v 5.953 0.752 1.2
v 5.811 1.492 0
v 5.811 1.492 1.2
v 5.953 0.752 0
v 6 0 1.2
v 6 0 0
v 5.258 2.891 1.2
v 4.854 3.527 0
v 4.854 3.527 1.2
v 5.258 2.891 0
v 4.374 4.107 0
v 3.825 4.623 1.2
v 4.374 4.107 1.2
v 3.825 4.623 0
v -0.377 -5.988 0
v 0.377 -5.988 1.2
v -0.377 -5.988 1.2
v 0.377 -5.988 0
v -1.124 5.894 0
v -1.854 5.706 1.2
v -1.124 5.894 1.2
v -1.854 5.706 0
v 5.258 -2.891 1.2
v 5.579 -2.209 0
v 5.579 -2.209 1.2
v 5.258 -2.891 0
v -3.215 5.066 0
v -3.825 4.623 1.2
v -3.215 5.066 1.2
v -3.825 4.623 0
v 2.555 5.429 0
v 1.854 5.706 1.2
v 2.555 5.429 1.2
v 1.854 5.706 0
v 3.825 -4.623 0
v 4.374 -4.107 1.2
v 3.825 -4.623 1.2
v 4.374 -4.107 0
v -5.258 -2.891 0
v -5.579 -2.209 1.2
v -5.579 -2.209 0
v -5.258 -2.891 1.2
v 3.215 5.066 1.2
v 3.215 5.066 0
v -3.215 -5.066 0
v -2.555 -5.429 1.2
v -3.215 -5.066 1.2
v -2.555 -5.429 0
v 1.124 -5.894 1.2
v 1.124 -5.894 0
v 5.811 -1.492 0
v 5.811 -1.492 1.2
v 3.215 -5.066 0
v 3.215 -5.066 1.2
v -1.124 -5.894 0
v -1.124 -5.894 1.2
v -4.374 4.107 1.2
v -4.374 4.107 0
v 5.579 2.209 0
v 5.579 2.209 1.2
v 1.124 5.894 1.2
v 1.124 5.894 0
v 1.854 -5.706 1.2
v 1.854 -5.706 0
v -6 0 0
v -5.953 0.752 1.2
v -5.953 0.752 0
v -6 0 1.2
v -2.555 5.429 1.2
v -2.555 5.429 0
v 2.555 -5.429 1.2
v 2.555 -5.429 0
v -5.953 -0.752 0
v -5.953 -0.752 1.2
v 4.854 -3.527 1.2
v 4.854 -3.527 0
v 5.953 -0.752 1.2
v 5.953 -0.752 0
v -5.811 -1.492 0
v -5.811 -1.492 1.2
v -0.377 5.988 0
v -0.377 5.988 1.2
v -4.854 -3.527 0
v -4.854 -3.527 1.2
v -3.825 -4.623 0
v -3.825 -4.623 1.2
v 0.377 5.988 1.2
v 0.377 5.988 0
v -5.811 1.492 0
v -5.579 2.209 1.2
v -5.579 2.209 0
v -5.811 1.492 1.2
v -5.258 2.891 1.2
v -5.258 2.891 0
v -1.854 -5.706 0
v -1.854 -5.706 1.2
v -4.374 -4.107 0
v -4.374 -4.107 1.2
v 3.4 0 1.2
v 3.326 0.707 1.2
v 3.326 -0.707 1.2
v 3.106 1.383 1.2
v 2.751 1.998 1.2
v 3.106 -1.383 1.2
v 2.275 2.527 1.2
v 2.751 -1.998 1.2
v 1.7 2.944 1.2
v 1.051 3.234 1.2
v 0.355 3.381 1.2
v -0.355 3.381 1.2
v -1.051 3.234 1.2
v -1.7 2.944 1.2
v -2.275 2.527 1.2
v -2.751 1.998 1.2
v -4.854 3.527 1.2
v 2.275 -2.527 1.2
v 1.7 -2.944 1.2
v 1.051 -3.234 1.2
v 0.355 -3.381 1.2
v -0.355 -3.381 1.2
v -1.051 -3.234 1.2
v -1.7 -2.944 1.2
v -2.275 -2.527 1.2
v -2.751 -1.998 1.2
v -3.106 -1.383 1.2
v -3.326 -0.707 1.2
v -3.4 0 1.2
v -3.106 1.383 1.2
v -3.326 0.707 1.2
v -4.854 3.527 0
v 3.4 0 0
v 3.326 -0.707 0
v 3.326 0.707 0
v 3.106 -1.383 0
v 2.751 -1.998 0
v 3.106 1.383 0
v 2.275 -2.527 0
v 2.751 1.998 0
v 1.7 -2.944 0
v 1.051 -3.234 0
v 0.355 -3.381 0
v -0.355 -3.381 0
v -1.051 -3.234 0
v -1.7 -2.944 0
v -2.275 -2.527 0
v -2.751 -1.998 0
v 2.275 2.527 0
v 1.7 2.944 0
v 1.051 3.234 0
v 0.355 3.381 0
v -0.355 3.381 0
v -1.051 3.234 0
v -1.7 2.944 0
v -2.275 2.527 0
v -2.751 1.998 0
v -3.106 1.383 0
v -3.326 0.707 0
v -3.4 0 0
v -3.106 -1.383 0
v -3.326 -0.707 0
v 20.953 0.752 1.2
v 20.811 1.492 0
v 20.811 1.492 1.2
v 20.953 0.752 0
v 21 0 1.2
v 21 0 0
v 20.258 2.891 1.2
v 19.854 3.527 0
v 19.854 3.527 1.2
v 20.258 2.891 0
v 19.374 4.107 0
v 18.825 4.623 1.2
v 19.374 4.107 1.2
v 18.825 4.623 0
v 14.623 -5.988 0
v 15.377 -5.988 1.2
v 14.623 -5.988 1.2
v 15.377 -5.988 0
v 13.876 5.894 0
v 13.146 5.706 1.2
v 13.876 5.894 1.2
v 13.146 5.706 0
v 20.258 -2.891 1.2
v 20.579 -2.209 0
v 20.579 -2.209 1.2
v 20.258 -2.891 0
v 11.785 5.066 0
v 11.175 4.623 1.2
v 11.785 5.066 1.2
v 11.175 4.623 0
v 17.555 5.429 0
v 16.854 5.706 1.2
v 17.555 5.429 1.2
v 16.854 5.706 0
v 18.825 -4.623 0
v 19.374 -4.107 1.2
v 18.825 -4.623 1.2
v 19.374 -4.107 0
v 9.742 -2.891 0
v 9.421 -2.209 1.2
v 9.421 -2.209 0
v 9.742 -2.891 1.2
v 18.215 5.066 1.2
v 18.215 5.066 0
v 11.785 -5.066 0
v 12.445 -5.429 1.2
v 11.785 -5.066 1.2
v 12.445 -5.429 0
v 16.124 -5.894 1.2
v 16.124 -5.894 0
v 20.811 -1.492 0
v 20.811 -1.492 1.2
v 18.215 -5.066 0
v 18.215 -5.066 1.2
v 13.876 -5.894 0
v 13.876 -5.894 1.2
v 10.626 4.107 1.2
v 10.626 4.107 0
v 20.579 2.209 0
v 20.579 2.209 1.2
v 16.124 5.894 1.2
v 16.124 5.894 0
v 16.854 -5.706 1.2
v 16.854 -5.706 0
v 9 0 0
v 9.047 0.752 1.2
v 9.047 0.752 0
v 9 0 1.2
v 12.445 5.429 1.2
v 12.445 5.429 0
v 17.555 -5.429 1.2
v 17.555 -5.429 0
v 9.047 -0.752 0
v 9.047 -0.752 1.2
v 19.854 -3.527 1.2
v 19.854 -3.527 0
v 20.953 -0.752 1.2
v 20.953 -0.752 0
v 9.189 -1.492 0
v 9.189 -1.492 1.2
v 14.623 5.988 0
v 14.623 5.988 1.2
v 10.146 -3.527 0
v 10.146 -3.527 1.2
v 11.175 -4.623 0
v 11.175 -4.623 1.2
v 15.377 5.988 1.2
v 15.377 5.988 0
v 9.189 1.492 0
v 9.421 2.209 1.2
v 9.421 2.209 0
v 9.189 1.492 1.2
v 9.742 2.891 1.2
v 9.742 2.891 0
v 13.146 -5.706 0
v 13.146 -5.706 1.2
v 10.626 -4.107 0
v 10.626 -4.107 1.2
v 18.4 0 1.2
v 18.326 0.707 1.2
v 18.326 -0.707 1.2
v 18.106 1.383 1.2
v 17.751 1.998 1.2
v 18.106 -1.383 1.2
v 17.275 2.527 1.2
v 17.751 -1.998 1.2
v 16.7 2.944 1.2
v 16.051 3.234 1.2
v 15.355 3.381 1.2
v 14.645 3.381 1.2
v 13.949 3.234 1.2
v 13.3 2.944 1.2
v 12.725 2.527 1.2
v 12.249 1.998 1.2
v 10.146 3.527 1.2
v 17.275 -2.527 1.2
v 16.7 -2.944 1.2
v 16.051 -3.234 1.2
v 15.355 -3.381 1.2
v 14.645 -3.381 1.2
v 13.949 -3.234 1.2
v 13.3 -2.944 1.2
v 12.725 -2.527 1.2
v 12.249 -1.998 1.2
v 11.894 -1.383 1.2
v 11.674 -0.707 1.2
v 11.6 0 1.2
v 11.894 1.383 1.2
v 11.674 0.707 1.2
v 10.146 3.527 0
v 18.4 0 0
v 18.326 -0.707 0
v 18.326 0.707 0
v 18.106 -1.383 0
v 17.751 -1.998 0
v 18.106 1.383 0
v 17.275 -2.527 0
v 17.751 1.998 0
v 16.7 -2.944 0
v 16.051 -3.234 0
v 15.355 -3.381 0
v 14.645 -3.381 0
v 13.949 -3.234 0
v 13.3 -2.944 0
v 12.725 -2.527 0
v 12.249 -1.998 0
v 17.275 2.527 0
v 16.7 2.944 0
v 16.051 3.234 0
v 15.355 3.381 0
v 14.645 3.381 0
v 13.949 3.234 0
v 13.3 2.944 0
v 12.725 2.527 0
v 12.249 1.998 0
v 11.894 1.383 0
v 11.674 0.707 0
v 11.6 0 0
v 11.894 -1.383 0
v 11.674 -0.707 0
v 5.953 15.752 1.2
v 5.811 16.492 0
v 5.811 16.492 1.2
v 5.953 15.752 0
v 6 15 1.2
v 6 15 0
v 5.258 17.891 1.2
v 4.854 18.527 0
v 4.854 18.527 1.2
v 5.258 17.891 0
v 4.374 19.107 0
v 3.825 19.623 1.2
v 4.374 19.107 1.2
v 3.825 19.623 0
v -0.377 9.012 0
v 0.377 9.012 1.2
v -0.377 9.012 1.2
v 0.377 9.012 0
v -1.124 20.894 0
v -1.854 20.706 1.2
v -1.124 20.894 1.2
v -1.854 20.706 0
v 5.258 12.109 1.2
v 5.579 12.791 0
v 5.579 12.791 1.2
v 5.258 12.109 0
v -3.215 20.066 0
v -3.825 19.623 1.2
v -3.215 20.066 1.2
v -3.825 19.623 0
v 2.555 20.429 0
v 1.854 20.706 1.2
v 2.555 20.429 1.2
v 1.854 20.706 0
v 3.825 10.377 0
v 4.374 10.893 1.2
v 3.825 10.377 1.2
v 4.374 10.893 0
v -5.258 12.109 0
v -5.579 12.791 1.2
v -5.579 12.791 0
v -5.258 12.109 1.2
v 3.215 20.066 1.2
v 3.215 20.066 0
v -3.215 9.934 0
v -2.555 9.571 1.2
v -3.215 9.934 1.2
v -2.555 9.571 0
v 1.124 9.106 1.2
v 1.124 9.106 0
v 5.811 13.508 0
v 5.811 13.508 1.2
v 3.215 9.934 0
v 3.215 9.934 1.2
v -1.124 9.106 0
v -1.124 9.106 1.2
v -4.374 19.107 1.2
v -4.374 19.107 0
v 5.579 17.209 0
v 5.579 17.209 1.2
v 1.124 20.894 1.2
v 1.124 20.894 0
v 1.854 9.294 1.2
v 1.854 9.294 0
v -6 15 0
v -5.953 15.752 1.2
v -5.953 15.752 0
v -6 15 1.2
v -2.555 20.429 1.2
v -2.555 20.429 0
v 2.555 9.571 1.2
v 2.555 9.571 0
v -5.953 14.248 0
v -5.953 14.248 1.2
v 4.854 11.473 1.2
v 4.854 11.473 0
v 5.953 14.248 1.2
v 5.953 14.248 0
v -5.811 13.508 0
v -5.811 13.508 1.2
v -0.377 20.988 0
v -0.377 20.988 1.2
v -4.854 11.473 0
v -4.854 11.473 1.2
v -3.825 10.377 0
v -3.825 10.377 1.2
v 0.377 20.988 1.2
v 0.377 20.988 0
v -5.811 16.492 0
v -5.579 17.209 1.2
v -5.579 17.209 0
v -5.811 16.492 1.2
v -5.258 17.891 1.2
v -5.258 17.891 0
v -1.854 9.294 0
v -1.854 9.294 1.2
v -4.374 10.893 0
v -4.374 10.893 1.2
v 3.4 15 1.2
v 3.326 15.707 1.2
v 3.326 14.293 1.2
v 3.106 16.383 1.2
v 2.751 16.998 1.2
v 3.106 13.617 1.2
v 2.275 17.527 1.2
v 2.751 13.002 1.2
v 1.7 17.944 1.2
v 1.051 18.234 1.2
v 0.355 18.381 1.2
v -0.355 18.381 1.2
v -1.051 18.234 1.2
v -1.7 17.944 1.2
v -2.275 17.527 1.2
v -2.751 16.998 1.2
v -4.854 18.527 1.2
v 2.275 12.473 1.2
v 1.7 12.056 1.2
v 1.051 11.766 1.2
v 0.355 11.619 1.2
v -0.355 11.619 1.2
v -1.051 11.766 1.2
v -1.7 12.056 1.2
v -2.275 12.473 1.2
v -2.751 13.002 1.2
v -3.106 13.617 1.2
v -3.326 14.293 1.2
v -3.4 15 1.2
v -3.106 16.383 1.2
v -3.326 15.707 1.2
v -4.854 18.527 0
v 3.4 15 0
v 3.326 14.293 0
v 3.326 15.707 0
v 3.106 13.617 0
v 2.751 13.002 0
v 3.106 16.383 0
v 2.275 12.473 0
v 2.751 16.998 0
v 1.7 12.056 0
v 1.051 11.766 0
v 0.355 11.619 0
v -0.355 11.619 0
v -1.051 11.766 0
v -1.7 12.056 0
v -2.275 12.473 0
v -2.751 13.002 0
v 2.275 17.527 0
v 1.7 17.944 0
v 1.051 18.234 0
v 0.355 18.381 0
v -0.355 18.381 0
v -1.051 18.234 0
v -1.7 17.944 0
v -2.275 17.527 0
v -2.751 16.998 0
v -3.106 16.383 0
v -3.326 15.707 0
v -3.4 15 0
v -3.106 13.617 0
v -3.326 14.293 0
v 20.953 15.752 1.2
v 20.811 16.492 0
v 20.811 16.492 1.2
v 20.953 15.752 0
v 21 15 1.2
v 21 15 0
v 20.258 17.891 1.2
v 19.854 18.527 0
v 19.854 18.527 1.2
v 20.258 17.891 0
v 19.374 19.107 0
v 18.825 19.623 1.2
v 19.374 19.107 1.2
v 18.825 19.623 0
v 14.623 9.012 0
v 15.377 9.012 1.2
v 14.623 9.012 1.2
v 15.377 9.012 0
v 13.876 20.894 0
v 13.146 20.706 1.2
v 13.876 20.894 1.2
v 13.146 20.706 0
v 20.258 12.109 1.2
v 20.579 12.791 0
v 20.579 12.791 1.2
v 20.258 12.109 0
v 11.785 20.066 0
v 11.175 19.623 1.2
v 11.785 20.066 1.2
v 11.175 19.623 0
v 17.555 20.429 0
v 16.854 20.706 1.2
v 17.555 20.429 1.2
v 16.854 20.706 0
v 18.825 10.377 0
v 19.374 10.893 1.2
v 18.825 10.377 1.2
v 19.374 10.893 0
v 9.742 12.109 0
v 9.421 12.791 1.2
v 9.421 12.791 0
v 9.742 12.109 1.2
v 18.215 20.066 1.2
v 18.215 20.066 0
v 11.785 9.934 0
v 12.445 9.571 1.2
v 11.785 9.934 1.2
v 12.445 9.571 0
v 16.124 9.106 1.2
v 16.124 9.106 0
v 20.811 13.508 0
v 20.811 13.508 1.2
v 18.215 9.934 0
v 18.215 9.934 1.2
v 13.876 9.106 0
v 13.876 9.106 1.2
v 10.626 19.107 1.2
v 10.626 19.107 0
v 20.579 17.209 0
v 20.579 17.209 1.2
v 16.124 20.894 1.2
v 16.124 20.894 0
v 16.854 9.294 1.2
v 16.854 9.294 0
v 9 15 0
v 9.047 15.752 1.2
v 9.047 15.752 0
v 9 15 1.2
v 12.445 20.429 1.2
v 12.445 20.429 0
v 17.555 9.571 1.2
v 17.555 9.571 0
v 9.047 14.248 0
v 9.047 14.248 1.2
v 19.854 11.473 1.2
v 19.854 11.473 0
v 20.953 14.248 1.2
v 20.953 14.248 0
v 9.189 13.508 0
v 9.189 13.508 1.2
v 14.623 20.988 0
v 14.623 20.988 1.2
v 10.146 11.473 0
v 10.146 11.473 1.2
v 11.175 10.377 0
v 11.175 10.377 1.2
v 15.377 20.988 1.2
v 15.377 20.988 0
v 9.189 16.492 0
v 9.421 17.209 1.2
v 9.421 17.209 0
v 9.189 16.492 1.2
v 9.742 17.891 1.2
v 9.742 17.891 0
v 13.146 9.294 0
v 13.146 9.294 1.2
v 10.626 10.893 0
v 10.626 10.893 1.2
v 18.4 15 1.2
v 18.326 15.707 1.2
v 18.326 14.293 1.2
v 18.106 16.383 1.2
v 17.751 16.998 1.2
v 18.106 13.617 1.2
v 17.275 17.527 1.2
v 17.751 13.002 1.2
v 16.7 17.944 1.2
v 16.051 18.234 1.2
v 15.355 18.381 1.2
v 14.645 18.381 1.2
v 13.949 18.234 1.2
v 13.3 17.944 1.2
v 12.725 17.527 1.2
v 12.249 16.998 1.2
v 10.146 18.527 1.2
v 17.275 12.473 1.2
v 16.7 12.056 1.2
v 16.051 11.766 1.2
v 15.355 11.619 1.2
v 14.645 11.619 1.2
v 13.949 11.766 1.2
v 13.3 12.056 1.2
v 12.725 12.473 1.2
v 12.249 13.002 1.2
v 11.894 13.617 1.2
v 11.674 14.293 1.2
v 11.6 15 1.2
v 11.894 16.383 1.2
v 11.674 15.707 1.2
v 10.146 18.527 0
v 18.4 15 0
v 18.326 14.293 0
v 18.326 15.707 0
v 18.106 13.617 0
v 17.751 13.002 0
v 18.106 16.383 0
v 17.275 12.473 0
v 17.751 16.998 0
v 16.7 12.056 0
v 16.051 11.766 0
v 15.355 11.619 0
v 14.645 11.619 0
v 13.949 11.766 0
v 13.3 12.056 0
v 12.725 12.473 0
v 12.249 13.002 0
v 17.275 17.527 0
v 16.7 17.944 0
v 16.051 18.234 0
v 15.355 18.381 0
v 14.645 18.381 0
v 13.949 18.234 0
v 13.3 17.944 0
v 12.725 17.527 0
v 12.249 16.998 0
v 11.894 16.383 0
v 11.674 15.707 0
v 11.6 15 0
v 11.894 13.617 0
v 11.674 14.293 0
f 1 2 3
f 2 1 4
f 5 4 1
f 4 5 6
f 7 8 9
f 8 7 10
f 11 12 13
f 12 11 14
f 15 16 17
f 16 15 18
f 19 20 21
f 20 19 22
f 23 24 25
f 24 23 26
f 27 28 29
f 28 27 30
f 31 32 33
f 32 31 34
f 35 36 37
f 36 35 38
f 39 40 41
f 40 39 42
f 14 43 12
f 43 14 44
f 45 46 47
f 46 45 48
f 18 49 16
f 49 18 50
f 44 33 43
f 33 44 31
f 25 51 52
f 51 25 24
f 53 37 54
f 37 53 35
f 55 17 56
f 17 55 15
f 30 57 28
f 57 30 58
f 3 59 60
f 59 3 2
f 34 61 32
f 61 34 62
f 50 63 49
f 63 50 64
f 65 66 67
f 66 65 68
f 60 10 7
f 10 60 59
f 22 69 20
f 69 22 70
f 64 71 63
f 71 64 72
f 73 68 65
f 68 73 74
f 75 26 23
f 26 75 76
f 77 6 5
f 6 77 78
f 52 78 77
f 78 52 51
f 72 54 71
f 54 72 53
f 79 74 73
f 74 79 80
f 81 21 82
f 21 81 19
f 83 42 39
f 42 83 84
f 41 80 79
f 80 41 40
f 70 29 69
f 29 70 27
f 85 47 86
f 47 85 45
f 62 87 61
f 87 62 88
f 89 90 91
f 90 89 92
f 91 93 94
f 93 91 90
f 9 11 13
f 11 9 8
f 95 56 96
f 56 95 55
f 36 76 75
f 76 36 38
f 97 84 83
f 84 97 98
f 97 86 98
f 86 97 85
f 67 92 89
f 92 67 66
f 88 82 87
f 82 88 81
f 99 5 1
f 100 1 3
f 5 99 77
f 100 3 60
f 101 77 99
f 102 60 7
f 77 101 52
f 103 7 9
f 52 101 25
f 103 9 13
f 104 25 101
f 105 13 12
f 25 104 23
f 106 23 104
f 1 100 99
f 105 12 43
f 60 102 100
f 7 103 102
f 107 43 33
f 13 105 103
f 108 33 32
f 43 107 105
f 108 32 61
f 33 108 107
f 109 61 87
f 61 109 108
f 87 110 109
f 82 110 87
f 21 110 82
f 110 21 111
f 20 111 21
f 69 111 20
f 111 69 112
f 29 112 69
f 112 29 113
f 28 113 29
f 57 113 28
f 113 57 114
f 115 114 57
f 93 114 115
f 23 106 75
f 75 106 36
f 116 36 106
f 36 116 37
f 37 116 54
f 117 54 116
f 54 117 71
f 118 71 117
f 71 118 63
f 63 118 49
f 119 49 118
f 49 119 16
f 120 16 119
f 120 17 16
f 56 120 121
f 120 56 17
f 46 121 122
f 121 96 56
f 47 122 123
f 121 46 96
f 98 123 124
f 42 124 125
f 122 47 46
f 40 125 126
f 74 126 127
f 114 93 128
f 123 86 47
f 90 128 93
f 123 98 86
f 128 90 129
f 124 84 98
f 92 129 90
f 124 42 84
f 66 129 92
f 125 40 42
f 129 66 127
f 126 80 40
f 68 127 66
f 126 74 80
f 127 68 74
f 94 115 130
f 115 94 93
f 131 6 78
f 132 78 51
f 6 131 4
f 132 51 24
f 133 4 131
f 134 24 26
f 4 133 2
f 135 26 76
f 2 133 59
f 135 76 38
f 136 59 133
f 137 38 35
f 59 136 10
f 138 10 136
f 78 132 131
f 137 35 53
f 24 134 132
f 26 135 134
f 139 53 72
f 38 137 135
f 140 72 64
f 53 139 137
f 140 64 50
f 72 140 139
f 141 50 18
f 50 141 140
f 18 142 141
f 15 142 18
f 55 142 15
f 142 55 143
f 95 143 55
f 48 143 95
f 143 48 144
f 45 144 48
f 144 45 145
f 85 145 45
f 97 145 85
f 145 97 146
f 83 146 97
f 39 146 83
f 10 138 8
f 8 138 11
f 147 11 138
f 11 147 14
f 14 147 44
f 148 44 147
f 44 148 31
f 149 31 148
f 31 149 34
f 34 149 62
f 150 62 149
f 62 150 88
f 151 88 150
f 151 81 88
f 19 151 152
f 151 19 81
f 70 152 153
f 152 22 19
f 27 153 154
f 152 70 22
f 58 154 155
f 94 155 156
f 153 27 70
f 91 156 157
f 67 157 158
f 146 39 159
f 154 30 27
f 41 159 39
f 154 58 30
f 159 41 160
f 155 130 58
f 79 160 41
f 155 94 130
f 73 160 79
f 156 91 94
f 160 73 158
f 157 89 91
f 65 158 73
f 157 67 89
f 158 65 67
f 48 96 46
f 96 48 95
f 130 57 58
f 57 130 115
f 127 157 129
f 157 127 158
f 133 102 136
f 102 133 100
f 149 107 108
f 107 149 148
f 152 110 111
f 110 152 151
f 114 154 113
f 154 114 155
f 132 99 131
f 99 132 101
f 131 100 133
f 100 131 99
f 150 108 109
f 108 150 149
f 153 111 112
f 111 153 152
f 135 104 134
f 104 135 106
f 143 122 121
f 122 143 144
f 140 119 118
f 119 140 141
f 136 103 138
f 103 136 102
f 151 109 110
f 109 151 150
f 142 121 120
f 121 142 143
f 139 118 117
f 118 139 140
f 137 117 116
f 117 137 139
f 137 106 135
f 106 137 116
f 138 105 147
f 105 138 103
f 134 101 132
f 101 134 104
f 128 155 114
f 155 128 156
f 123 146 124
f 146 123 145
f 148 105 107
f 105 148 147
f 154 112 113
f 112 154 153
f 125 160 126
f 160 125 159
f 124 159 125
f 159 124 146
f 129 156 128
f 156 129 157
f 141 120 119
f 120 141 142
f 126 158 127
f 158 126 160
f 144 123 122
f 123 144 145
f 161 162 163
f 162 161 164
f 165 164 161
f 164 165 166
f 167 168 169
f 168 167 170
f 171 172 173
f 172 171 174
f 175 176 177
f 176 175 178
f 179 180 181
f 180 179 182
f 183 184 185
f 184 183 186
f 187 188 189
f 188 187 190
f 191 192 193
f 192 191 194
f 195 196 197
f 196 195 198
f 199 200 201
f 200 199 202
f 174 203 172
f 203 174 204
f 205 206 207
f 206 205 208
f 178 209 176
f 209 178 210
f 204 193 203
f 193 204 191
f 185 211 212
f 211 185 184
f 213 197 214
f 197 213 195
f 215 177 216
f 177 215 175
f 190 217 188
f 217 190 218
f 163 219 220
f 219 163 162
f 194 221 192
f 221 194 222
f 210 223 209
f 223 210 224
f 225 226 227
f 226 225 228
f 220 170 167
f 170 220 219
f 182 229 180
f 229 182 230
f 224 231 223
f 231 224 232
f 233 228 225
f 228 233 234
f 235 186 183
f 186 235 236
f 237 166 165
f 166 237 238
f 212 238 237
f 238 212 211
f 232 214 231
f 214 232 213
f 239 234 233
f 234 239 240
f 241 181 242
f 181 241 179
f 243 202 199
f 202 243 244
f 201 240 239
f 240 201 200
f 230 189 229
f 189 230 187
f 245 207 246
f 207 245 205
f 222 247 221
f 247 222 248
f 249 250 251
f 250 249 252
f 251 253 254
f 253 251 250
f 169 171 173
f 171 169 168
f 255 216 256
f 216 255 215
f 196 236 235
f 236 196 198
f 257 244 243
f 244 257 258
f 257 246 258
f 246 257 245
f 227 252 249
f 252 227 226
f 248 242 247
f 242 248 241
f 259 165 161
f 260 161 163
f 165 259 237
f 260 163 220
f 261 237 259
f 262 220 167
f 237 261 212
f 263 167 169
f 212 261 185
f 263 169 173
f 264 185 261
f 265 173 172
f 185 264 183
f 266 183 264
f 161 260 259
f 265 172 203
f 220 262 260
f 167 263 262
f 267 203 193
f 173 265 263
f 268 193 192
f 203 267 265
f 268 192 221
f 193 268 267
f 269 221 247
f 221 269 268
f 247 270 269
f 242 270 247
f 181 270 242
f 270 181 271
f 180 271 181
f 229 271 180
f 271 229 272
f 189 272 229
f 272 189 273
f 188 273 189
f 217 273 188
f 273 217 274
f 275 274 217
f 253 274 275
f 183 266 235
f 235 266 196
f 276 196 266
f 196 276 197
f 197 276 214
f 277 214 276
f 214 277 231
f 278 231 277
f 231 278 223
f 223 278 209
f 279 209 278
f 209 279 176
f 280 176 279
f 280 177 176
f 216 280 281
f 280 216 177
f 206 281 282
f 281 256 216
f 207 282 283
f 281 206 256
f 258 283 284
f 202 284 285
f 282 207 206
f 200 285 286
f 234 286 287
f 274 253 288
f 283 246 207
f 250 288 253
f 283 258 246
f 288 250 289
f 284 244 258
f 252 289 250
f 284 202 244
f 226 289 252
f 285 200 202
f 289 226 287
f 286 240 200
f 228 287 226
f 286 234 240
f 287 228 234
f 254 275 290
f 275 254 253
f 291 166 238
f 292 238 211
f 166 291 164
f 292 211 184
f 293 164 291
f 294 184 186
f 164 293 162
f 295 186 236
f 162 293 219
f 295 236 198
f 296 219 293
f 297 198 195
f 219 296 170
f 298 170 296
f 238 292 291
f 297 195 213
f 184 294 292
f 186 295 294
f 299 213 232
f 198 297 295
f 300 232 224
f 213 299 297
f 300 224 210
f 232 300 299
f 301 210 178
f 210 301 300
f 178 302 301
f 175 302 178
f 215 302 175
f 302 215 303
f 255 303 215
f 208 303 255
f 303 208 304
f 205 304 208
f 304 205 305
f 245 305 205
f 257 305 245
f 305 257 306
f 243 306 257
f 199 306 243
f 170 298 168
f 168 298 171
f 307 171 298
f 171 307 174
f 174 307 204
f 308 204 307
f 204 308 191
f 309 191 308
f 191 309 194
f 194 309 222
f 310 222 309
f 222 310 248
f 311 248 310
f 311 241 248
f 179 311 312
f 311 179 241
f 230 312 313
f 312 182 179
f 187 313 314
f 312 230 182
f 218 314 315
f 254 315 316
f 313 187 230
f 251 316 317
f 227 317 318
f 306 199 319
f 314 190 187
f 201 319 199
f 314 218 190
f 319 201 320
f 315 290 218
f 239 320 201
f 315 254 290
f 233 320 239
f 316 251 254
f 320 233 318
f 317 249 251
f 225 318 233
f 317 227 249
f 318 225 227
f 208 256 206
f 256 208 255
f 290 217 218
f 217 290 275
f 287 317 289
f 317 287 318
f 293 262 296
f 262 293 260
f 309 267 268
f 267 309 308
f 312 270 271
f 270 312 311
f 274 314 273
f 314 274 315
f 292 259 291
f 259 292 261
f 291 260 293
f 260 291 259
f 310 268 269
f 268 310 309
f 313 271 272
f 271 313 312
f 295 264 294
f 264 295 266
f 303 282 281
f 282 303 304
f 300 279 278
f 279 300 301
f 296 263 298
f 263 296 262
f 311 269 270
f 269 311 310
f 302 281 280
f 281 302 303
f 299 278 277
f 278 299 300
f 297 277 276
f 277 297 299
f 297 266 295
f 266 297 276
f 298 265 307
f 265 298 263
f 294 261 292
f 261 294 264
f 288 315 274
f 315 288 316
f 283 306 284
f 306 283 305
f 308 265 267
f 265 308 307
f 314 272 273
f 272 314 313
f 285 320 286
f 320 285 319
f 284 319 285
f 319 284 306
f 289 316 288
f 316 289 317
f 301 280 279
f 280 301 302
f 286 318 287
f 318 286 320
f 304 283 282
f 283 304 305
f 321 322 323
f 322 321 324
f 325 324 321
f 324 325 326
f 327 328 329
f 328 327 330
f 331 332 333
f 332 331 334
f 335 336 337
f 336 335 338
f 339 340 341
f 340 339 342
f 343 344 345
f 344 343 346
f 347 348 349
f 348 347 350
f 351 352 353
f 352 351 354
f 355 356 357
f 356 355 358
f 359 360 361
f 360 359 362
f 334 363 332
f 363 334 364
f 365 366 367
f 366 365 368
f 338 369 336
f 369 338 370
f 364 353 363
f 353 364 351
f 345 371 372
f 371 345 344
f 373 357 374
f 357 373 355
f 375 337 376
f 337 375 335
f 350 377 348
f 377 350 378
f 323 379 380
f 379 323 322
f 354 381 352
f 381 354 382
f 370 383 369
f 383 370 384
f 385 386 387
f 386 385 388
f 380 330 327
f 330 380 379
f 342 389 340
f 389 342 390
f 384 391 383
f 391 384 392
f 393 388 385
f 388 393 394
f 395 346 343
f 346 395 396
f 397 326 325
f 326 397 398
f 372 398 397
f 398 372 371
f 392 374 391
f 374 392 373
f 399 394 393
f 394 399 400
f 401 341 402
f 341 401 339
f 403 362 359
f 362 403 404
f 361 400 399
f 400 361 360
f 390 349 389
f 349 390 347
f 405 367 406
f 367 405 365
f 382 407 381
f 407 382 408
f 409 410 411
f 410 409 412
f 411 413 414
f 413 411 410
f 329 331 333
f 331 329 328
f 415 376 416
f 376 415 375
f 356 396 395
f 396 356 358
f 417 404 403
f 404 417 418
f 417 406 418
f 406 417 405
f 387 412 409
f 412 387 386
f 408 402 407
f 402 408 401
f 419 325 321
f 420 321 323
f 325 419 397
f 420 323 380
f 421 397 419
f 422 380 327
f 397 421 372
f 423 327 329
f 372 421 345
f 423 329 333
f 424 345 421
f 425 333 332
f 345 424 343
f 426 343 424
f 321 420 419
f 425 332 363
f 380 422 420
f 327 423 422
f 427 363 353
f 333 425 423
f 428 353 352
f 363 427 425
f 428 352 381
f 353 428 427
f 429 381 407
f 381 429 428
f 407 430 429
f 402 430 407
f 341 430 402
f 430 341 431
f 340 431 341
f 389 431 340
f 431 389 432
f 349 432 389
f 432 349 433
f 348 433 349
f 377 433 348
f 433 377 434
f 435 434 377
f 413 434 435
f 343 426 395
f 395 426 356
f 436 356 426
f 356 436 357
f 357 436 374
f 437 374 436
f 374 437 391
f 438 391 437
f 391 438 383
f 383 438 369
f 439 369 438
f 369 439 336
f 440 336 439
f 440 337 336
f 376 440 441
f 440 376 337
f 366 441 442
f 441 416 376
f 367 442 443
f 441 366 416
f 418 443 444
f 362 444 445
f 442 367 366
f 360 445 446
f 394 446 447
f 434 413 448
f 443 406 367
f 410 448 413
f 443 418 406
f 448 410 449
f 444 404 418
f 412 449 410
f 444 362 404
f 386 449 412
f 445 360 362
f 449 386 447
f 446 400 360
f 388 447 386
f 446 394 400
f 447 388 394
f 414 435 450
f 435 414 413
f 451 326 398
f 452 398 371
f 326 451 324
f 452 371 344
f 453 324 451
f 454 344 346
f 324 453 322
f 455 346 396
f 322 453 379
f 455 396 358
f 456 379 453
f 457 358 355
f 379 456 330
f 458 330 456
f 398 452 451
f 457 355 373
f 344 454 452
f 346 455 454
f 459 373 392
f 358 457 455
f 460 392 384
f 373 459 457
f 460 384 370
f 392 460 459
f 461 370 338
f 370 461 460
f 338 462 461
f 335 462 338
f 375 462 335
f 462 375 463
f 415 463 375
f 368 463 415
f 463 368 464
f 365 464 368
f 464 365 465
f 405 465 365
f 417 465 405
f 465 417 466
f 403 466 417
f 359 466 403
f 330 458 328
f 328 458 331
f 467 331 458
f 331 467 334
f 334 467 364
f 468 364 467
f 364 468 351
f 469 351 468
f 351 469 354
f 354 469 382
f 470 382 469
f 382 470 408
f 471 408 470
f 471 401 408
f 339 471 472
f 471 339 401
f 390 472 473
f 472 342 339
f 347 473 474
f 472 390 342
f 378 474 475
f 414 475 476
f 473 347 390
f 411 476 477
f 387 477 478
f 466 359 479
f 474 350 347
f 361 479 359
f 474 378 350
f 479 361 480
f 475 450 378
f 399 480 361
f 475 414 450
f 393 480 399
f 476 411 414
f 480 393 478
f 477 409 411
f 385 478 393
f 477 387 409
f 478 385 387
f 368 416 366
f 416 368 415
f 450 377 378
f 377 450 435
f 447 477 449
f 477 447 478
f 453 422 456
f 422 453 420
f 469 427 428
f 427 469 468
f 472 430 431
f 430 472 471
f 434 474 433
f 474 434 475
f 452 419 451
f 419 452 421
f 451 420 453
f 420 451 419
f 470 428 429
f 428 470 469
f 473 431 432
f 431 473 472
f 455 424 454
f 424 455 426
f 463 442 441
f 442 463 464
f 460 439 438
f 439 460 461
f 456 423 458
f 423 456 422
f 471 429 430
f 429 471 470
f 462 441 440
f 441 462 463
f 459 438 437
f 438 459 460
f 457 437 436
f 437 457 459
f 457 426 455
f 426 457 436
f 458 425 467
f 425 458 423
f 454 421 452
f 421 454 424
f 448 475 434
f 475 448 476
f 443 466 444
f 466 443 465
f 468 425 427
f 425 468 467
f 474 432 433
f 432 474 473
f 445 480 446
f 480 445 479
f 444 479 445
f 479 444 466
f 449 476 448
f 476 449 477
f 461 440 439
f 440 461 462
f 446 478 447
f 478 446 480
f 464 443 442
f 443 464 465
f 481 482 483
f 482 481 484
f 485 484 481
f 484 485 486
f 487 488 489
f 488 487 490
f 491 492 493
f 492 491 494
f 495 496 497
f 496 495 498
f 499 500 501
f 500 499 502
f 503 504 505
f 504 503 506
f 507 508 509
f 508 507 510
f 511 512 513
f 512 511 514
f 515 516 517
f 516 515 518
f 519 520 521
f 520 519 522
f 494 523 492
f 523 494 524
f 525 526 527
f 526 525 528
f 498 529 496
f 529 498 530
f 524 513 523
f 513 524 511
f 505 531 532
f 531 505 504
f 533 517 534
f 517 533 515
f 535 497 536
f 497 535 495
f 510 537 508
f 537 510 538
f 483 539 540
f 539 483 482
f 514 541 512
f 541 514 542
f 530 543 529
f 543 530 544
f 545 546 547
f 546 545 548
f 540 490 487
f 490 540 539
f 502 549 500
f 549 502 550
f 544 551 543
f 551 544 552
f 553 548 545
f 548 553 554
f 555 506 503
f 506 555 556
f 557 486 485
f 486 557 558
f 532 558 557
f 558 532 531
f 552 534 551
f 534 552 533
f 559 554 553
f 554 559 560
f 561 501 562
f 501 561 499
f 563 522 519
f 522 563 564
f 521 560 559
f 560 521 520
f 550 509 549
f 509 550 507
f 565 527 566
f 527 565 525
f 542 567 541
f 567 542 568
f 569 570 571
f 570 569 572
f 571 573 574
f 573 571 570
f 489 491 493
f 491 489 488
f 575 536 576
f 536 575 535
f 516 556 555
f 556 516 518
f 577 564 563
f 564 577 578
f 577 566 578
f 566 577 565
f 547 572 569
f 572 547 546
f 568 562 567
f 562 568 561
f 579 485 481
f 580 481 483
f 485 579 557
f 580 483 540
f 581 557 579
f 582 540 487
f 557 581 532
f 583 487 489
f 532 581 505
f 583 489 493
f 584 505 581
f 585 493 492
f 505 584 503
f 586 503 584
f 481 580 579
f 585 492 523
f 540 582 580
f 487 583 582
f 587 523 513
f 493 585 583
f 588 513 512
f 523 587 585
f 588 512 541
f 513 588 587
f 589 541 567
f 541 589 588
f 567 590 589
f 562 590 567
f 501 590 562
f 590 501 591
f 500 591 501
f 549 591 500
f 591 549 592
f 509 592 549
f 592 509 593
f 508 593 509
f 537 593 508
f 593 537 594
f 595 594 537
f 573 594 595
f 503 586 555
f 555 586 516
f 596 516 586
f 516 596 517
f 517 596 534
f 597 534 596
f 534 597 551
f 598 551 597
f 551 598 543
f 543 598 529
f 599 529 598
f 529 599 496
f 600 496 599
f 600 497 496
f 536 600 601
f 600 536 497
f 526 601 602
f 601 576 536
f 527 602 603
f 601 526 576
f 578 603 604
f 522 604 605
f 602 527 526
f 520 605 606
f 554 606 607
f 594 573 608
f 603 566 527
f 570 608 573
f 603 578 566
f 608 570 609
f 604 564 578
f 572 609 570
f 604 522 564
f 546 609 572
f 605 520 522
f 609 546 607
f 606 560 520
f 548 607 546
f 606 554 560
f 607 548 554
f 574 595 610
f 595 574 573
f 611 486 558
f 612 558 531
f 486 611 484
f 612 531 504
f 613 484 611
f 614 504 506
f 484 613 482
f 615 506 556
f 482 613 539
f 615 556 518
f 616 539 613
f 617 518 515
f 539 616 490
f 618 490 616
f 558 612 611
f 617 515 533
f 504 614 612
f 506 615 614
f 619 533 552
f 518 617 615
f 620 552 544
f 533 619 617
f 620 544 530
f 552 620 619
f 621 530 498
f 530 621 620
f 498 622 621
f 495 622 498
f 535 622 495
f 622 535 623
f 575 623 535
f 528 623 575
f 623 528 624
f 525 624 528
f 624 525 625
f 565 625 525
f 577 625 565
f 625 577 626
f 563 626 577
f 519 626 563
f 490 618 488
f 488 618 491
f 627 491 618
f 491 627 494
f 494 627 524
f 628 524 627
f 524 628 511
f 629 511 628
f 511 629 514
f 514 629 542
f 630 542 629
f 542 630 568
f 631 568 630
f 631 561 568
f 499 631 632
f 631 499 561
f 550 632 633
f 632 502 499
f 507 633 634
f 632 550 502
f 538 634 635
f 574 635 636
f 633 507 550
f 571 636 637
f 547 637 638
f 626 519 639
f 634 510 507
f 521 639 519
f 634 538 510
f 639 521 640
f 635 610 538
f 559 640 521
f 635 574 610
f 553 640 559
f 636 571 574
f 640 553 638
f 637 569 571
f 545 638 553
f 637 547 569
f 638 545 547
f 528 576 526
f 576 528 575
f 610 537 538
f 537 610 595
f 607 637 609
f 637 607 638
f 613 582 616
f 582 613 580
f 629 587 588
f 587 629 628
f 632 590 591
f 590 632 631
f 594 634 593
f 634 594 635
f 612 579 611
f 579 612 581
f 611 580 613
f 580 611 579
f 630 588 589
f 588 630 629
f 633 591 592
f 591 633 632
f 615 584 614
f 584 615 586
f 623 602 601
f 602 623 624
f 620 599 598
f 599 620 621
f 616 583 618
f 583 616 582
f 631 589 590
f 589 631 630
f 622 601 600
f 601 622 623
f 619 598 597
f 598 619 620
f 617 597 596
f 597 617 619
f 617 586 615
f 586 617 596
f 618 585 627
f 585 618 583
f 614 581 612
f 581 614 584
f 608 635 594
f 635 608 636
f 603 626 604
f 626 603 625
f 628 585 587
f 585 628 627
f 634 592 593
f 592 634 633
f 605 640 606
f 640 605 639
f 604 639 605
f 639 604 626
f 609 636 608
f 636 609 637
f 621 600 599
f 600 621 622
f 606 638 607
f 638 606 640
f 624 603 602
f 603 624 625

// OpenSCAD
// file: dronePlates.scad
/**
 * dronePlates.scad
 * Plate library
 *
 * GNU GPL V3
 * @author: Victor Potenciano
 */

m3Rad = 3.4/2;
cornerR = 4;

/**
 *
 */
module helperDisk(diameter) {
	cylinder(r = diameter/2, h = 0.6, $fn=20);
}

/**
 *
 */
module roundedRect(size, radius) {
	x = size[0];
	y = size[1];
	z = size[2];

	linear_extrude(height=z)
	hull() {
	// place 4 circles in the corners, with the given radius
	translate([(-x/2)+(radius/2), (-y/2)+(radius/2), 0]){ circle(r=radius); }
	translate([(x/2)-(radius/2), (-y/2)+(radius/2), 0]){ circle(r=radius); }
	translate([(-x/2)+(radius/2), (y/2)-(radius/2), 0]){ circle(r=radius); }
	translate([(x/2)-(radius/2), (y/2)-(radius/2), 0]){ circle(r=radius); }
	}
}

/**
 * rounded rectangle triangle with corner at origin
 */
module roundedTriangle(size, radius) {
	x = size[0];
	y = size[1];
	z = size[2];

	linear_extrude(height=z)
	hull() {
	translate([radius, radius, 0]){ circle(r=radius); }
	translate([x-radius, radius, 0]){ circle(r=radius); }
	translate([radius, y-radius, 0]){ circle(r=radius); }
	}
}

/**
 *
 */
module roundRectPlate(w, l, plateThick=3) {
	difference(){
		roundedRect([l+m3Rad*1.75,w+m3Rad*1.75,plateThick], cornerR);
		translate([l/2, w/2, -0.5]) { cylinder(h = plateThick+1, r = m3Rad, $fn=30); }
		translate([-l/2, w/2, -0.5]) { cylinder(h = plateThick+1, r = m3Rad, $fn=30); }
		translate([l/2, -w/2, -0.5]) { cylinder(h = plateThick+1, r = m3Rad, $fn=30); }
		translate([-l/2, -w/2, -0.5]) { cylinder(h = plateThick+1, r = m3Rad, $fn=30); }
	}
}

/**
 *
 */
module crossSquarePlate(l, thick=3) {
	inDist = cornerR*2+4;
	trianL = sqrt((l*l)/2)-inDist;
	centerR = 4;

	difference(){
		roundRectPlate(l, l, thick);
		translate([0, centerR, -0.5]) { 
			rotate([0,0,45]){ roundedTriangle([trianL,trianL,thick+1], cornerR-2); }
		}
		translate([0, -centerR, -0.5]) { 
			rotate([0,0,225]){ roundedTriangle([trianL,trianL,thick+1], cornerR-2); }
		}
		translate([-centerR, 0, -0.5]) { 
			rotate([0,0,135]){ roundedTriangle([trianL,trianL,thick+1], cornerR-2); }
		}
		translate([centerR, 0, -0.5]) { 
			rotate([0,0,-45]){ roundedTriangle([trianL,trianL,thick+1], cornerR-2); }
		}
	}
}

/**
 *
 */
module hShapePlate(w, l, thick=4) {
	inDist = cornerR*2+1;

	difference(){
		roundRectPlate(w, l, thick);
		translate([0, w/4, -0.5]) { roundedRect([l-inDist,w/2-inDist,thick+1], cornerR-2); }
		translate([0, -w/4, -0.5]) { roundedRect([l-inDist,w/2-inDist,thick+1], cornerR-2); }
	}
}

/**
 *
 */
module motorCircleMount(inDia, outDia, thick=3, extraH=false, d1=19, d2=16, holeR=m3Rad ) {
	difference(){
		cylinder(h = thick, r = outDia/2, $fn=30);
		motorCircleMountHoles(inDia, outDia, thick, extraH, d1=d1, d2=d2, holeR=holeR);
	}
}

/**
 *
 */
module motorCircleMountHoles(inDia, outDia, thick=3, extraH=false, d1=19, d2=16, d3=25, holeR=m3Rad) {
	translate([0, 0, -0.5]) { cylinder(h = thick+1, r = inDia/2, $fn=30); }

	for(i=[0:3]) {
		rotate([0,0,90*i]){
		translate([d1/2, 0, -0.5]) cylinder(h = thick+1, r = holeR, $fn=20);
		translate([d2/2, 0, -0.5]) cylinder(h = thick+1, r = holeR, $fn=20);
		translate([d2/2, -holeR, -0.5]) cube(size = [(d1-d2)/2,holeR*2,thick+1]);
		}
	}
	
	if(extraH==true){	
		for(i=[-1,1]) translate([i*d3/2, 0, -0.5]) { cylinder(h = thick+1, r = holeR, $fn=30); }
	}
}

/**
 *
 */
module motorRectMount(w, l, inDia, thick=3) {
	d1=19;
	d2=16;

	difference(){
		roundRectPlate(w, l, thick);
		translate([0, 0, -0.5]) { cylinder(h = thick+1, r = inDia/2, $fn=30); }
		translate([0, d1/2, -0.5]) { cylinder(h = thick+1, r = m3Rad, $fn=30); }
		translate([0, -d1/2, -0.5]) { cylinder(h = thick+1, r = m3Rad, $fn=30); }
		translate([d2/2, 0, -0.5]) { cylinder(h = thick+1, r = m3Rad, $fn=30); }
		translate([-d2/2, 0, -0.5]) { cylinder(h = thick+1, r = m3Rad, $fn=30); }
	}
}

/**
 *
 */
module tube(inDia, outDia, height) {
	difference(){
		cylinder(h = height, r = outDia/2, $fn=50);
		translate([0, 0, -0.5]) { cylinder(h = height+1, r = inDia/2, $fn=30); }
	}
}

/**
 *
 */
module squareTube(inDia, outDia, height) {
	translate([0,0,height/2]){
	difference(){
		cube(size = [outDia,outDia,height], center = true);
		cube(size = [inDia,inDia,height+1], center = true);
	}
	}
}

/**
 *
 */
module djiFlamewheelHoles(height) {
	a = 23;
	b = 16;
	c = 19.5;
	
	translate([a/2, c/2, 0]) { cylinder(h = height, r = m3Rad, $fn=30); }
	translate([-a/2, c/2, 0]) { cylinder(h = height, r = m3Rad, $fn=30); }
	translate([b/2, -c/2, 0]) { cylinder(h = height, r = m3Rad, $fn=30); }
	translate([-b/2, -c/2, 0]) { cylinder(h = height, r = m3Rad, $fn=30); }
}

/**
 *
 */
module djiFlamewheelHolesBotton(height) {
	a1 = 21;
	c = 19.5;
	
	translate([a1/2, c/2, 0]) { cylinder(h = height, r = m3Rad, $fn=30); }
	translate([-a1/2, c/2, 0]) { cylinder(h = height, r = m3Rad, $fn=30); }
}

/**
 *
 */
module propeller(size){
union(){
difference(){
	cylinder(h = 3, r = size/2, center=true, $fn=30);
	cylinder(h = 3.1, r = size/2-2, center=true, $fn=30); 
}
for( i = [-1,1] ){
rotate([0,0,45*i]){ cube(size = [size,4,1], center = true); }
}
}
}

/**
 *
 */
module slot(length, height, rad){
for(i=[-1,1]) translate([i*length/2,0,0]) cylinder(h = height, r = rad, $fn=30);
translate([0,0,height/2]) cube(size = [length,rad*2,height], center = true);
}

 

////////////////////////
// Examples:
////////////////////////

motorCircleMount(8, 25, 3.5);

//roundedRect([50,50,3], 4);

//hShapePlate(79, 25);

//rotate([0,0,45]){roundedTriangle([40,40,3], 4);}

//crossSquarePlate(45, 4);

/*
union(){
motorRectMount(21, 18, 8, 4);
translate([9, 10.5, 0]) {tube(m3Rad*2, 6.5, 6);}
}
*/

/*
difference(){
union(){
hShapePlate(50, 30, 3.5);
translate([-4,-25,0]){cube(size = [8,50,3.5]);}
rotate([0, 0, 45]) {motorCircleMount(8, 35, 3.5);}
}
cylinder(h = 10, r = 4, $fn=100, center=true);
}
*/

//rotate([90,0,0]){ tube(5,10,20); }
//translate([20,0,0]){ squareTube(5, 10, 20); }
// main file
/**
 * washers
 *
 */
use <dronePlates.scad>
inRad = 6.8/2;
dia = 12;
thick = 1.2;
shift=15;

rows = 2;
cols = 2;

for(i=[0:rows-1]) for(j=[0:cols-1]){
	translate([j*shift,i*shift,0]) tube(inRad*2, dia, thick);
}
